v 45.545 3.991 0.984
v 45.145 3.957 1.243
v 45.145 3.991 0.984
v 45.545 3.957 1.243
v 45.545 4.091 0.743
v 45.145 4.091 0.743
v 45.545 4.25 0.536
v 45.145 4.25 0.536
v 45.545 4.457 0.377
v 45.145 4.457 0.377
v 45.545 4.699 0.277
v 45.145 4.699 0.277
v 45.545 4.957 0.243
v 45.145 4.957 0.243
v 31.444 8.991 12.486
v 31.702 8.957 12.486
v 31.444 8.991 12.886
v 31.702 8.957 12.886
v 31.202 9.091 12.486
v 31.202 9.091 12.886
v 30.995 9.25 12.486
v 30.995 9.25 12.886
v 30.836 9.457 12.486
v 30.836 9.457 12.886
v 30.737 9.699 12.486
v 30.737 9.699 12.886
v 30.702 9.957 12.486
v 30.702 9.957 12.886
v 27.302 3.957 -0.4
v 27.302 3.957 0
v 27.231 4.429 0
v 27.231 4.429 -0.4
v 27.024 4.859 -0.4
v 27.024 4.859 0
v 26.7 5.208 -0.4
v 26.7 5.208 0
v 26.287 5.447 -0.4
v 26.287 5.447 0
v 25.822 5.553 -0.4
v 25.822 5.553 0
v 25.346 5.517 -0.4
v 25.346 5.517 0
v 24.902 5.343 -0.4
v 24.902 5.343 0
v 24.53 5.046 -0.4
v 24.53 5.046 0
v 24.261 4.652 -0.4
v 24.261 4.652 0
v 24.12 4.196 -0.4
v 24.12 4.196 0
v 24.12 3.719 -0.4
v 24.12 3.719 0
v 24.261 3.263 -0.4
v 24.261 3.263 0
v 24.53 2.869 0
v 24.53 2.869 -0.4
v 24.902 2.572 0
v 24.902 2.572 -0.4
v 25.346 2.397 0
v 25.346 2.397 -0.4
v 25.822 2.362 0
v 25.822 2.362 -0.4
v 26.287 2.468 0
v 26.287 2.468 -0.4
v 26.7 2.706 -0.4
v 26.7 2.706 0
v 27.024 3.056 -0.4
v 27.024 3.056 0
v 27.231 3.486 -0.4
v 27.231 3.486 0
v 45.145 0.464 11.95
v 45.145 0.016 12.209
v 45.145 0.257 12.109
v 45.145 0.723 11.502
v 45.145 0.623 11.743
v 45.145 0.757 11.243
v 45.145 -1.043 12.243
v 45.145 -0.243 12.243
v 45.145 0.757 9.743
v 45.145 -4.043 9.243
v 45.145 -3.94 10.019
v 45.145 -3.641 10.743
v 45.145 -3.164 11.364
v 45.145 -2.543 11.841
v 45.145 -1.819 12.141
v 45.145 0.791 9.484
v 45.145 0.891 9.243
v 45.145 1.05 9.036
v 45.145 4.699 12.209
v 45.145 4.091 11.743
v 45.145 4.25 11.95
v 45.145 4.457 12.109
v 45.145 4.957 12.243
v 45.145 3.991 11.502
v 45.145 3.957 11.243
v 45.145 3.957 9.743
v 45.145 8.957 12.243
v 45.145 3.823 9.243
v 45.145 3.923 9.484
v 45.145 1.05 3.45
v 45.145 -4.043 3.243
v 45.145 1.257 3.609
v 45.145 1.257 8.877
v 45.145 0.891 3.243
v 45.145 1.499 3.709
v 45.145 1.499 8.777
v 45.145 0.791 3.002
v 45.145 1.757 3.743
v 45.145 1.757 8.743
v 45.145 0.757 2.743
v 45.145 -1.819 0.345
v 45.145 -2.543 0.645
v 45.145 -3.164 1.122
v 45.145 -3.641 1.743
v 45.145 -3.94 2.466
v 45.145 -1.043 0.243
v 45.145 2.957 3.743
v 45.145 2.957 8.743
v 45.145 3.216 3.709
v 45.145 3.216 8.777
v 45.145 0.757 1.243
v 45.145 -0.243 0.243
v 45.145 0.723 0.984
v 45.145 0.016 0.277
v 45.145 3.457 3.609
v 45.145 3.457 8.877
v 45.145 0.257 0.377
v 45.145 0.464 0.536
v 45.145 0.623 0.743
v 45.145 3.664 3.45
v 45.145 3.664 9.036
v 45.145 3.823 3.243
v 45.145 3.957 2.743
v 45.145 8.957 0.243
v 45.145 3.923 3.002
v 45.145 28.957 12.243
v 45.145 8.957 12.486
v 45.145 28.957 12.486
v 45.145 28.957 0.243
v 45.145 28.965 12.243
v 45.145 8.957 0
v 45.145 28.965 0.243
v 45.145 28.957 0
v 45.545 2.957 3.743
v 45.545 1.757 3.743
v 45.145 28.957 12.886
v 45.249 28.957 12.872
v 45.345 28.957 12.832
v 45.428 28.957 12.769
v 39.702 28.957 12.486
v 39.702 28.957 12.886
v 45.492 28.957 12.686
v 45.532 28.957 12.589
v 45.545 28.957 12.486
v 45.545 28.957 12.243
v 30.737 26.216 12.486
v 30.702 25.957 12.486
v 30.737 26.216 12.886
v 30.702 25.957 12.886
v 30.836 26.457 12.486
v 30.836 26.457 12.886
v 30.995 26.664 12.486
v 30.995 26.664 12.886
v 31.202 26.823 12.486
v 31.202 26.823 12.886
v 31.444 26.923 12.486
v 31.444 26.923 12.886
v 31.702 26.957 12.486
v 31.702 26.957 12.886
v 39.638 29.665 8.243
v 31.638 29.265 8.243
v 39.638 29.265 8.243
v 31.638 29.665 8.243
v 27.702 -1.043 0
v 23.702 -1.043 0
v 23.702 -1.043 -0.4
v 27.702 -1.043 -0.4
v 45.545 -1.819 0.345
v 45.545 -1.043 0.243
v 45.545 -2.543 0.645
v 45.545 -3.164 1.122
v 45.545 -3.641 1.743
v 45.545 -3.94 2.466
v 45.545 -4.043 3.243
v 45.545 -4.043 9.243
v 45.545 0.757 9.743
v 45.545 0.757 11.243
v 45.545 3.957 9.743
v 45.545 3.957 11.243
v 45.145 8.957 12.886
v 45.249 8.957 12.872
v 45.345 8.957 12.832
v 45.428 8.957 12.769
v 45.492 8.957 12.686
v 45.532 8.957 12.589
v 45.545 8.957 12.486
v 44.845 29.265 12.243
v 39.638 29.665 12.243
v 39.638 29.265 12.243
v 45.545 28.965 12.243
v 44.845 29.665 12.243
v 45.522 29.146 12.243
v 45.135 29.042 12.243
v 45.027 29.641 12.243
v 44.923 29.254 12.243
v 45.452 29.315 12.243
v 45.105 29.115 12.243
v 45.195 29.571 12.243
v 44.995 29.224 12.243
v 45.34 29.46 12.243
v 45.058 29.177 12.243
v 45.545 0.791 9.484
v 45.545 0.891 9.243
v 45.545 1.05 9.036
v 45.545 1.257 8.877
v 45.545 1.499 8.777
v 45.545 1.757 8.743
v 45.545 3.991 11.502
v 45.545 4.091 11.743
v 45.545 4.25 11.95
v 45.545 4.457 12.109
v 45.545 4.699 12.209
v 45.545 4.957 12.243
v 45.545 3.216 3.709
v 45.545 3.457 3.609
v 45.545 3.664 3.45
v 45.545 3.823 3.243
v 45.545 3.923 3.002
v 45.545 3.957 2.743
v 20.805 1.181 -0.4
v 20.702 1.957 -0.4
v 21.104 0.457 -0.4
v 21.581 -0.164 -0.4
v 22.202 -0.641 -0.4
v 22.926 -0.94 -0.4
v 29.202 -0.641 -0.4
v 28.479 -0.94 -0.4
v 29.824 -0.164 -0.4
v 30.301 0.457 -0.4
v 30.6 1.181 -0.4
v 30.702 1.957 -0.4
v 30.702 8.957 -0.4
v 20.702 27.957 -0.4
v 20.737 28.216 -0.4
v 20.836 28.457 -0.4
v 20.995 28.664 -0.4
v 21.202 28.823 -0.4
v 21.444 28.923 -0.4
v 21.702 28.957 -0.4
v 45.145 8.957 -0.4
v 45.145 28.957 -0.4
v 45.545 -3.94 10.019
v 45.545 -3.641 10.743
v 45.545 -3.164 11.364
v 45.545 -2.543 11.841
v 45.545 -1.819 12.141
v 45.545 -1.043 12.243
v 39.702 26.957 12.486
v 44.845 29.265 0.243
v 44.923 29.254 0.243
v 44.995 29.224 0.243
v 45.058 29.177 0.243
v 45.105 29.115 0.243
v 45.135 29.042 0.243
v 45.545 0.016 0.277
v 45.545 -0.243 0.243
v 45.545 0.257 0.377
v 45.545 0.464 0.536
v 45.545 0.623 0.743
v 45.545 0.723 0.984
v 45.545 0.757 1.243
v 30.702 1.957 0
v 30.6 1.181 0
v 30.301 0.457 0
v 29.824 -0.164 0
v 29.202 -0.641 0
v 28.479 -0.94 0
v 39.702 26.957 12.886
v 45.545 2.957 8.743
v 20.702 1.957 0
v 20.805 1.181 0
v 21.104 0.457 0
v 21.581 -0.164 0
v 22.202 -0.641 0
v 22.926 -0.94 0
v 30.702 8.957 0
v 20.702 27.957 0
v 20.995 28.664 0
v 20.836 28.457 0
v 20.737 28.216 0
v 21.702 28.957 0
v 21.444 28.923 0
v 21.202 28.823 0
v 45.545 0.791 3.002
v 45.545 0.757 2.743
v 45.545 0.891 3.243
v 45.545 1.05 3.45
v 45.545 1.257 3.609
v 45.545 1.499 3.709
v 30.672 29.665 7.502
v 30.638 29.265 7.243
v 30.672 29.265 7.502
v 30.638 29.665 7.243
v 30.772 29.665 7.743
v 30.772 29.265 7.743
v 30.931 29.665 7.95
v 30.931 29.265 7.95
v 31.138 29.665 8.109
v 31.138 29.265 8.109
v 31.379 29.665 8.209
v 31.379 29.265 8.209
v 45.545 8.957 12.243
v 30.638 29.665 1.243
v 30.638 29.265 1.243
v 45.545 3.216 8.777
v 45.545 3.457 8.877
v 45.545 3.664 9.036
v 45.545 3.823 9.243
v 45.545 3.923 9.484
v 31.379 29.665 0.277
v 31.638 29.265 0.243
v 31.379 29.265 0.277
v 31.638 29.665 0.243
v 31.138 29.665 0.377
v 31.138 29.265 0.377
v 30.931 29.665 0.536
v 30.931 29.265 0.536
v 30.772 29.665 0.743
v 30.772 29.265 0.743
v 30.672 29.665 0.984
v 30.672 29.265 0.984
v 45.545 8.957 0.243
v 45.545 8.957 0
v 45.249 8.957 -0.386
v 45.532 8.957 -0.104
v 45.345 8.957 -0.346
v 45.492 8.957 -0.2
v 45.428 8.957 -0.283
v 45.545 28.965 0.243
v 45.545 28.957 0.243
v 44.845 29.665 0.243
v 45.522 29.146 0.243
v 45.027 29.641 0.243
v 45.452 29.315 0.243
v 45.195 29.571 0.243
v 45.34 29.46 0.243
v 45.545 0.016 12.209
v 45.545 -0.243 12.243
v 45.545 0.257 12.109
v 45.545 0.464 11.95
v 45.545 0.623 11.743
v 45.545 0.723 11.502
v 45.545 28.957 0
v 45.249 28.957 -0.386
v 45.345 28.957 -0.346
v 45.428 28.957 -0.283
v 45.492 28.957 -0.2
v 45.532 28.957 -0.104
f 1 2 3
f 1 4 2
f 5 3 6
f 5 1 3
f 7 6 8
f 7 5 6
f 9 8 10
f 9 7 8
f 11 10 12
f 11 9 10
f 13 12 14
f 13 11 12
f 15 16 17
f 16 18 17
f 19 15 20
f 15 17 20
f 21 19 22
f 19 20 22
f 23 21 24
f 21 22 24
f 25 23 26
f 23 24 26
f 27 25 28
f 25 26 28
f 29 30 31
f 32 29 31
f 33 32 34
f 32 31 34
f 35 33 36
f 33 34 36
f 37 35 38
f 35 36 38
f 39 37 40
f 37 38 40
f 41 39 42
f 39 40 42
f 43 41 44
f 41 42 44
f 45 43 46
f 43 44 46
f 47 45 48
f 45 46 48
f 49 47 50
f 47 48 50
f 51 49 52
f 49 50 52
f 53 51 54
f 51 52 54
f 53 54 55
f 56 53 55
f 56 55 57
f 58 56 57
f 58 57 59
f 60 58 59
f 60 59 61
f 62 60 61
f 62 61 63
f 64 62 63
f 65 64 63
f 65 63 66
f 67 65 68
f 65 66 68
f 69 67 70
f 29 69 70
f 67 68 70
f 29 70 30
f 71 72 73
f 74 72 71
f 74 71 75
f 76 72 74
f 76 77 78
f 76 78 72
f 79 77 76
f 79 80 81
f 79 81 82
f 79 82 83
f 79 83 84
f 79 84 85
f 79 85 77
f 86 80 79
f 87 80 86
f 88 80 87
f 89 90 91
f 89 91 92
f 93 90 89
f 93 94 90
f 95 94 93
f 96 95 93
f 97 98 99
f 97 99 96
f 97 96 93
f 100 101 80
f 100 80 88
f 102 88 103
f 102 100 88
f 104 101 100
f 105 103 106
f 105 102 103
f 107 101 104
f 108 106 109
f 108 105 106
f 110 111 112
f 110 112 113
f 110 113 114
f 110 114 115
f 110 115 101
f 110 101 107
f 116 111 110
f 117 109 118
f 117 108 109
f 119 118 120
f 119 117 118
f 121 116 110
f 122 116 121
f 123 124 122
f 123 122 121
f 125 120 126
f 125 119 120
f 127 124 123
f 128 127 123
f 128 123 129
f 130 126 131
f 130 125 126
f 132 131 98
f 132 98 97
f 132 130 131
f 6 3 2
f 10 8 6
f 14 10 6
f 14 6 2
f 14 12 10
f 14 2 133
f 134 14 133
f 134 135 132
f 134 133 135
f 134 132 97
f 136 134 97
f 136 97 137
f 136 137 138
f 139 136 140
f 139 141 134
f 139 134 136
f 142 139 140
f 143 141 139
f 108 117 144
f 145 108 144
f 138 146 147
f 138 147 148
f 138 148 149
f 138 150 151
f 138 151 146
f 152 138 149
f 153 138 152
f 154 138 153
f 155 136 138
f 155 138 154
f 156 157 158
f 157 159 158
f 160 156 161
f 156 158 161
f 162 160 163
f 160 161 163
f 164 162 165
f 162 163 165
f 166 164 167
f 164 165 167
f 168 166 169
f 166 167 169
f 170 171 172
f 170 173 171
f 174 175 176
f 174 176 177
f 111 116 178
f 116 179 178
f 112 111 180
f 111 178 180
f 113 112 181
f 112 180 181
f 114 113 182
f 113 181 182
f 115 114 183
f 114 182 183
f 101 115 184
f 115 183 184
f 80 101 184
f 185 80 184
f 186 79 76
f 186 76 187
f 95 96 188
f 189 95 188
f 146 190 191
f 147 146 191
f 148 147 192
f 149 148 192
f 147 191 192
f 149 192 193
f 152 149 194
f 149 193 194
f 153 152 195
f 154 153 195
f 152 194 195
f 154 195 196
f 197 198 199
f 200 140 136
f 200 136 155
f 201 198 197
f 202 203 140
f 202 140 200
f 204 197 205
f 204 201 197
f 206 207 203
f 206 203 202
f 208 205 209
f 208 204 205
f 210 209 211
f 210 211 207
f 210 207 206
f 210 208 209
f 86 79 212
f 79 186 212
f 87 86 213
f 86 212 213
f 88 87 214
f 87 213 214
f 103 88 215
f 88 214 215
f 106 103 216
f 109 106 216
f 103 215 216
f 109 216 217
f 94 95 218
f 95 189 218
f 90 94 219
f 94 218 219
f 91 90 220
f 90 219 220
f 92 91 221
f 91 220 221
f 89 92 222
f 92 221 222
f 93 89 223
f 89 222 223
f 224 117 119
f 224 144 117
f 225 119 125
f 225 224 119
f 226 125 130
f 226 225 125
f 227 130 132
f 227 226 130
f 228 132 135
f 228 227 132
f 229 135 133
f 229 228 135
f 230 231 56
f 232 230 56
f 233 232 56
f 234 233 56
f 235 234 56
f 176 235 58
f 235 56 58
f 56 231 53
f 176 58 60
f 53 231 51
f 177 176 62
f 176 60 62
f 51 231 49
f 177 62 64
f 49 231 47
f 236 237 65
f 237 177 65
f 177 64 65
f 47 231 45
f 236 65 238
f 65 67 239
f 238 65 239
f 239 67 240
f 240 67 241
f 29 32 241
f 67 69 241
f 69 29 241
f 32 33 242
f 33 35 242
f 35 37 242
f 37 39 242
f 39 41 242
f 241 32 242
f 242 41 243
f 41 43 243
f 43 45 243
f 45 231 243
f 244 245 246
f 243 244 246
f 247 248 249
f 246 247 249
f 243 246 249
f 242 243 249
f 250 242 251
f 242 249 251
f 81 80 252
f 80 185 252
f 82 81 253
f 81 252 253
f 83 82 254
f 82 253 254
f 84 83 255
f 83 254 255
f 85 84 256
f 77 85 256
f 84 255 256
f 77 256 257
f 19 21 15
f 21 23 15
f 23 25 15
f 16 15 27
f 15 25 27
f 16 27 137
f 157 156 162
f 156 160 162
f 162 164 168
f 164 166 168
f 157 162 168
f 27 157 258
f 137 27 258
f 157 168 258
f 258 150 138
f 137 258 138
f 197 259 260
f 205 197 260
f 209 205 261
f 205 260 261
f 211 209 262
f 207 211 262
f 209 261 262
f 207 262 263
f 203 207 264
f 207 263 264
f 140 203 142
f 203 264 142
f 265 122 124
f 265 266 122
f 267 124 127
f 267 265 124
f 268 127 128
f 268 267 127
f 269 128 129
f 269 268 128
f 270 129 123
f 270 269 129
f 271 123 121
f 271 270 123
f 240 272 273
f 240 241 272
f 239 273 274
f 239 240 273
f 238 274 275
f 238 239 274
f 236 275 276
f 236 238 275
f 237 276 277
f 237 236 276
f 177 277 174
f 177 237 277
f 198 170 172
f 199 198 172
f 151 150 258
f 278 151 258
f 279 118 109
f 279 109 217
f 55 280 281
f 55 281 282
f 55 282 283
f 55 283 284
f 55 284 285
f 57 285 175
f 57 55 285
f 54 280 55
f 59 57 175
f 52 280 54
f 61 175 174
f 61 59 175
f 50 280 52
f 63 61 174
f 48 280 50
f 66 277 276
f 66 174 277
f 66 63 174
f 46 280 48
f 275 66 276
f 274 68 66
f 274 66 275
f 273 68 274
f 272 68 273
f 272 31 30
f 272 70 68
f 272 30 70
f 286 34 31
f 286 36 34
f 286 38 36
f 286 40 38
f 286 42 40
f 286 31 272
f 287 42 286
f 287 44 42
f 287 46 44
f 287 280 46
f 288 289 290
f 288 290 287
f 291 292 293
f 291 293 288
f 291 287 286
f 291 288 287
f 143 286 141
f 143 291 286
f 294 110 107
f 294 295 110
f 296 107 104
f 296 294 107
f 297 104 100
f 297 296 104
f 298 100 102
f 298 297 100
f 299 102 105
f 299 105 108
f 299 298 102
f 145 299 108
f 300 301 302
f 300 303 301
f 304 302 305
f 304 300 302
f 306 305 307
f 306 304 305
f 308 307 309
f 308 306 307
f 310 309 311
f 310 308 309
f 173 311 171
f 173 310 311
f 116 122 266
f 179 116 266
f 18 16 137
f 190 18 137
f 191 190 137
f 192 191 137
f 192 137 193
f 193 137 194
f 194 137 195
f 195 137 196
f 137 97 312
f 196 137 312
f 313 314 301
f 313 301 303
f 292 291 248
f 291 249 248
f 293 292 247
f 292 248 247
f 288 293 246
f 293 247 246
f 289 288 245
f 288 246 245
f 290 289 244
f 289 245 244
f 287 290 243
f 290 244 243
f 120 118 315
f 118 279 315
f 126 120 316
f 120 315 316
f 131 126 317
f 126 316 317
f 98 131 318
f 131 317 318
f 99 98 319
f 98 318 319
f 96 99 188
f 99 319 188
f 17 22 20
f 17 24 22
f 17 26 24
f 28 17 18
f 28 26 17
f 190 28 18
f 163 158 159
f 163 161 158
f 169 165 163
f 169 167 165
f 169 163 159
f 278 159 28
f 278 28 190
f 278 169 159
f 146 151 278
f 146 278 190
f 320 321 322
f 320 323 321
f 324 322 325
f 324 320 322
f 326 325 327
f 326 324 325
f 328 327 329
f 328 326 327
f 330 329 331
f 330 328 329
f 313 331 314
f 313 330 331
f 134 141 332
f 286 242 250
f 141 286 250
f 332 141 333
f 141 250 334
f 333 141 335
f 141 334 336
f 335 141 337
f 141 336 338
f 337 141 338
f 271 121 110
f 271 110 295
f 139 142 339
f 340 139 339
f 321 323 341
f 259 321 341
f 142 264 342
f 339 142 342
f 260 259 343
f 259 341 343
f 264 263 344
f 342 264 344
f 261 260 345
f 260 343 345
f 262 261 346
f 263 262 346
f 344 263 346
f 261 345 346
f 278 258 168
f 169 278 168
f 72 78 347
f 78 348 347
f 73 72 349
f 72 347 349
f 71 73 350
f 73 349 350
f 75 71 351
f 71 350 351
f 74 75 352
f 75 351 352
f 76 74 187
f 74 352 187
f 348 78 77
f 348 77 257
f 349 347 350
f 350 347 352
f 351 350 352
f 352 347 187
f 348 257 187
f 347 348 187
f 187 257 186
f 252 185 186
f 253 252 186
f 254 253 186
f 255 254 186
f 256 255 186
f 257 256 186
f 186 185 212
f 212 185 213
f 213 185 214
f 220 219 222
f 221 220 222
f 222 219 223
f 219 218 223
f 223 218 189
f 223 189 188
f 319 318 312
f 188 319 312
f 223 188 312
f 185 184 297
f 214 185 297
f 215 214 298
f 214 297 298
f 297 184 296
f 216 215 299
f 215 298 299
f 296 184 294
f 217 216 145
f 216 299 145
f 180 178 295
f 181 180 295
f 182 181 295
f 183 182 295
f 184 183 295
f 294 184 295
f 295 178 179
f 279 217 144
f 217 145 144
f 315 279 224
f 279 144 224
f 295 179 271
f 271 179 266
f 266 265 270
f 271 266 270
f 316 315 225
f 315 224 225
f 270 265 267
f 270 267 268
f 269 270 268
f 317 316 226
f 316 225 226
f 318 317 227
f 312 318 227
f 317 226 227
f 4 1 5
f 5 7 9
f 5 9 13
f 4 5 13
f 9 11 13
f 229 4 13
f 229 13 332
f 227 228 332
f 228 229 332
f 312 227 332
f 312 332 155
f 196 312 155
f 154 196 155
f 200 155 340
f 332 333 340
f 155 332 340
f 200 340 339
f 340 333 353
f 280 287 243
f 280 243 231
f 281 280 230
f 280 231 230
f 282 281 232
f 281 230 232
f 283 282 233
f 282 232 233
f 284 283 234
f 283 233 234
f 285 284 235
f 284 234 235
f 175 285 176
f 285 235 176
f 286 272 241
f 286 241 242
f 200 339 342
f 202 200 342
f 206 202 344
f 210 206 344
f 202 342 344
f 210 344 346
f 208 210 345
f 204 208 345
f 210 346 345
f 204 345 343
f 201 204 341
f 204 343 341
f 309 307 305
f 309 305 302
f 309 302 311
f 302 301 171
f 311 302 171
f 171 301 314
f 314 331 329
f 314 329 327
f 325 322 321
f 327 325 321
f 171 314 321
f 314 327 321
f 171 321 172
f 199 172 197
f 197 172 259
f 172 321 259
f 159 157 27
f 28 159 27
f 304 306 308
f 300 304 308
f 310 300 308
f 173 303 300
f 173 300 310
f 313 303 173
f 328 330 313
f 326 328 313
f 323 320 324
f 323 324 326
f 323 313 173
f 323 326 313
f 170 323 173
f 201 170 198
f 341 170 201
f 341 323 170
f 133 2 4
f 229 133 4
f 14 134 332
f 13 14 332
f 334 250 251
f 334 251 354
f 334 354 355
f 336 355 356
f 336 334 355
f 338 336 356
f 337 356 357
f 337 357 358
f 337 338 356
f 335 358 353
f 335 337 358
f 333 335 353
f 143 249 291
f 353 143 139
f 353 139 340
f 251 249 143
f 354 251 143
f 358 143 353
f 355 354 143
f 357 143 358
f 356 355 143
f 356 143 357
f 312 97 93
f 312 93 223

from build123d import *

# Parameters (mm, degrees)
SKETCH1_R                   = 1.6
BASE_FLANGE1_DEPTH          = 0.4
SKETCHED_START              = 45.702497433
SKETCHED_BEND8_DEPTH        = 12
SKETCHED_BEND8_2_DEPTH      = 8
SKETCHED_START_2            = 53.702497433
SKETCHED_BEND8_3_DEPTH      = 4
SKETCHED_START_3            = -0.4
SKETCHED_BEND12_OUTLINE_W   = 12
SKETCHED_BEND12_OUTLINE_H   = 0.4
SKETCHED_BEND12_DEPTH       = 14.907300918
SKETCHED_START_4            = 0.242920367
SKETCHED_BEND12_2_OUTLINE_W = 0.4
SKETCHED_BEND12_2_OUTLINE_H = 4.8
SKETCHED_BEND12_2_DEPTH     = 12
SKETCHED_START_5            = 12.485840735
SKETCHED_BEND12_3_DEPTH     = 0.4
SKETCHED_BEND12_4_OUTLINE_W = 9
SKETCHED_BEND12_4_OUTLINE_H = 0.4
SKETCHED_BEND12_4_DEPTH     = 8
SKETCHED_START_6            = 3.742920367
SKETCHED_BEND12_5_OUTLINE_W = 0.4
SKETCHED_BEND12_5_OUTLINE_H = 3.2
SKETCHED_BEND12_5_DEPTH     = 5
SKETCHED_BEND12_6_OUTLINE_W = 0.4
SKETCHED_BEND12_6_OUTLINE_H = 20
SKETCHED_BEND12_6_DEPTH     = 12.485840735
SKETCHED_START_7            = -4.042672779
SKETCHED_BEND12_7_DEPTH     = 33.307300919
SKETCHED_START_8            = 8.957327221
SKETCHED_BEND12_8_DEPTH     = 20
FILLET1_R                   = 3
FILLET2_R                   = 1
FILLET3_R                   = 1


with BuildPart() as part:
    # Base-Flange1: sheet metal written as solids
    # Sketch1 → Base-Flange1 (new body)
    with BuildSketch(Plane.XY):
        Polygon((30.702497433, -1.042672779), (30.702497433, 8.957327221), (45.702497433, 8.957327221), (45.702497433, 3.957327221), (49.202497433, 3.957327221), (49.202497433, 0.757327221), (45.702497433, 0.757327221), (45.702497433, -4.042672779), (57.702497433, -4.042672779), (57.702497433, 0.757327221), (54.202497433, 0.757327221), (54.202497433, 3.957327221), (57.702497433, 3.957327221), (57.702497433, 8.957327221), (72.702497433, 8.957327221), (72.702497433, 26.957327221), (63.702497433, 26.957327221), (63.702497433, 28.957327221), (57.702497433, 28.957327221), (57.702497433, 34.957327221), (53.702497433, 34.957327221), (53.702497433, 43.957327221), (45.702497433, 43.957327221), (45.702497433, 28.957327221), (20.702497433, 28.957327221), (20.702497433, -1.042672779), align=None)
        with Locations((25.702497433, 3.957327221)):
            Circle(SKETCH1_R, mode=Mode.SUBTRACT)
    extrude(amount=-BASE_FLANGE1_DEPTH)

    # Sketched Bend8: read off the stored shape, not the designer's step
    # Sketched Bend8 outline → Sketched Bend8 (cut)
    with BuildSketch(Plane.YZ.offset(SKETCHED_START)):
        with BuildLine():
            ThreePointArc((29.597083672, 0), (29.338793878, -0.291607978), (28.96462814, -0.4))
            Line((28.96462814, -0.4), (43.957327221, -0.4))
            Line((43.957327221, -0.4), (43.957327221, 0))
            Line((43.957327221, 0), (29.597083672, 0))
        make_face()
    extrude(amount=SKETCHED_BEND8_DEPTH, mode=Mode.SUBTRACT)

    # Sketched Bend8 2 outline → Sketched Bend8 2 (add)
    with BuildSketch(Plane.YZ.offset(SKETCHED_START)):
        with BuildLine():
            Line((29.66462814, 14.507300918), (29.26462814, 14.507300918))
            Line((29.26462814, 14.507300918), (29.26462814, 0.3))
            ThreePointArc((29.26462814, 0.3), (29.176760174, 0.087867966), (28.96462814, 0))
            Line((28.96462814, 0), (29.597083672, 0))
            ThreePointArc((29.597083672, 0), (29.647533284, 0.146245118), (29.66462814, 0.3))
            Line((29.66462814, 0.3), (29.66462814, 14.507300918))
        make_face()
    extrude(amount=SKETCHED_BEND8_2_DEPTH)

    # Sketched Bend8 3 outline → Sketched Bend8 3 (add)
    with BuildSketch(Plane.YZ.offset(SKETCHED_START_2)):
        with BuildLine():
            Line((29.66462814, 0.3), (29.66462814, 5.507300918))
            Line((29.66462814, 5.507300918), (29.26462814, 5.507300918))
            Line((29.26462814, 5.507300918), (29.26462814, 0.3))
            ThreePointArc((29.26462814, 0.3), (29.176760174, 0.087867966), (28.96462814, 0))
            Line((28.96462814, 0), (29.597083672, 0))
            ThreePointArc((29.597083672, 0), (29.647533284, 0.146245118), (29.66462814, 0.3))
        make_face()
    extrude(amount=SKETCHED_BEND8_3_DEPTH)

    # Sketched Bend12: read off the stored shape, not the designer's step
    # Sketched Bend12 outline → Sketched Bend12 (cut)
    with BuildSketch(Plane.XY.offset(SKETCHED_START_3)):
        with Locations((51.702497433, 29.46462814)):
            Rectangle(SKETCHED_BEND12_OUTLINE_W, SKETCHED_BEND12_OUTLINE_H)
    extrude(amount=SKETCHED_BEND12_DEPTH, mode=Mode.SUBTRACT)



with BuildPart() as body_2:
    # Sketched Bend12 2 outline → Sketched Bend12 2 (new body)
    with BuildSketch(Plane.XY.offset(SKETCHED_START_4)):
        with BuildLine():
            ThreePointArc((45.545417801, 28.96462814), (45.340392547, 29.459602886), (44.845417801, 29.66462814))
            Line((44.845417801, 29.66462814), (39.638116882, 29.66462814))
            Line((39.638116882, 29.66462814), (39.638116882, 29.26462814))
            Line((39.638116882, 29.26462814), (44.845417801, 29.26462814))
            ThreePointArc((44.845417801, 29.26462814), (45.057549835, 29.176760174), (45.145417801, 28.96462814))
            Line((45.145417801, 28.96462814), (45.145417801, 3.957327221))
            Line((45.145417801, 3.957327221), (45.545417801, 3.957327221))
            Line((45.545417801, 3.957327221), (45.545417801, 28.96462814))
        make_face()
        with Locations((45.345417801, -1.642672779)):
            Rectangle(SKETCHED_BEND12_2_OUTLINE_W, SKETCHED_BEND12_2_OUTLINE_H)
    extrude(amount=SKETCHED_BEND12_2_DEPTH)

    # Sketched Bend12 4 outline → Sketched Bend12 4 (add)
    with BuildSketch(Plane.XY.offset(SKETCHED_START_4)):
        with Locations((35.138116882, 29.46462814)):
            Rectangle(SKETCHED_BEND12_4_OUTLINE_W, SKETCHED_BEND12_4_OUTLINE_H)
    extrude(amount=SKETCHED_BEND12_4_DEPTH)

    # Sketched Bend12 5 outline → Sketched Bend12 5 (add)
    with BuildSketch(Plane.XY.offset(SKETCHED_START_6)):
        with Locations((45.345417801, 2.357327221)):
            Rectangle(SKETCHED_BEND12_5_OUTLINE_W, SKETCHED_BEND12_5_OUTLINE_H)
    extrude(amount=SKETCHED_BEND12_5_DEPTH)


with BuildPart() as body_3:
    # Sketched Bend12 3 outline → Sketched Bend12 3 (new body)
    with BuildSketch(Plane.XY.offset(SKETCHED_START_5)):
        Polygon((45.145417801, 8.957327221), (45.145417801, 28.957327221), (39.702497433, 28.957327221), (39.702497433, 26.957327221), (30.702497433, 26.957327221), (30.702497433, 8.957327221), align=None)
    extrude(amount=SKETCHED_BEND12_3_DEPTH)


with BuildPart() as part_1:
    add(part.part)

    add(body_2.part)  # Sketched Bend12 6 merges body 2

    add(body_3.part)  # Sketched Bend12 6 merges body 3
    # Sketched Bend12 6 outline → Sketched Bend12 6 (add)
    with BuildSketch(Plane.XY):
        with Locations((45.345417801, 18.957327221)):
            Rectangle(SKETCHED_BEND12_6_OUTLINE_W, SKETCHED_BEND12_6_OUTLINE_H)
    extrude(amount=SKETCHED_BEND12_6_DEPTH)

    # Sketched Bend12 7 outline → Sketched Bend12 7 (cut)
    with BuildSketch(Plane(origin=(0, 0, 0), x_dir=(1, 0, 0), z_dir=(0, 1, 0)).offset(SKETCHED_START_7)):
        with BuildLine():
            ThreePointArc((45.145417801, 0.4), (45.428260513, 0.282842712), (45.545417801, 0))
            Line((45.545417801, 0), (45.702497433, 0))
            Line((45.702497433, 0), (45.702497433, -14))
            Line((45.702497433, -14), (57.702497433, -14))
            Line((57.702497433, -14), (57.702497433, 0))
            Line((57.702497433, 0), (72.702497433, 0))
            Line((72.702497433, 0), (72.702497433, 0.4))
            Line((72.702497433, 0.4), (45.145417801, 0.4))
        make_face()
    extrude(amount=SKETCHED_BEND12_7_DEPTH, mode=Mode.SUBTRACT)

    # Sketched Bend12 8 outline → Sketched Bend12 8 (add)
    with BuildSketch(Plane(origin=(0, 0, 0), x_dir=(1, 0, 0), z_dir=(0, 1, 0)).offset(SKETCHED_START_8)):
        with BuildLine():
            Line((45.145417801, -12.485840735), (45.145417801, -12.885840735))
            ThreePointArc((45.145417801, -12.885840735), (45.428260513, -12.768683447), (45.545417801, -12.485840735))
            Line((45.545417801, -12.485840735), (45.145417801, -12.485840735))
        make_face()
    extrude(amount=SKETCHED_BEND12_8_DEPTH)

    # Fillet1
    fillet1_edges = [part_1.edges().sort_by_distance(p)[0] for p in [
        (45.345417801, -4.042672779, 0.242920367),
        (45.345417801, -4.042672779, 12.242920367),
        (30.702497433, -1.042672779, -0.2),
        (20.702497433, -1.042672779, -0.2),
    ]]
    fillet(fillet1_edges, radius=FILLET1_R)

    # Fillet2
    fillet2_edges = [part_1.edges().sort_by_distance(p)[0] for p in [
        (20.702497433, 28.957327221, -0.2),
        (30.702497433, 26.957327221, 12.685840735),
        (30.702497433, 8.957327221, 12.685840735),
        (30.638116882, 29.46462814, 0.242920367),
        (30.638116882, 29.46462814, 8.242920367),
    ]]
    fillet(fillet2_edges, radius=FILLET2_R)

    # Fillet3
    fillet3_edges = [part_1.edges().sort_by_distance(p)[0] for p in [
        (45.345417801, 3.957327221, 0.242920367),
        (45.345417801, 3.957327221, 3.742920367),
        (45.345417801, 0.757327221, 3.742920367),
        (45.345417801, 0.757327221, 0.242920367),
        (45.345417801, 0.757327221, 12.242920367),
        (45.345417801, 0.757327221, 8.742920367),
        (45.345417801, 3.957327221, 8.742920367),
        (45.345417801, 3.957327221, 12.242920367),
    ]]
    fillet(fillet3_edges, radius=FILLET3_R)


solid = part_1.part
